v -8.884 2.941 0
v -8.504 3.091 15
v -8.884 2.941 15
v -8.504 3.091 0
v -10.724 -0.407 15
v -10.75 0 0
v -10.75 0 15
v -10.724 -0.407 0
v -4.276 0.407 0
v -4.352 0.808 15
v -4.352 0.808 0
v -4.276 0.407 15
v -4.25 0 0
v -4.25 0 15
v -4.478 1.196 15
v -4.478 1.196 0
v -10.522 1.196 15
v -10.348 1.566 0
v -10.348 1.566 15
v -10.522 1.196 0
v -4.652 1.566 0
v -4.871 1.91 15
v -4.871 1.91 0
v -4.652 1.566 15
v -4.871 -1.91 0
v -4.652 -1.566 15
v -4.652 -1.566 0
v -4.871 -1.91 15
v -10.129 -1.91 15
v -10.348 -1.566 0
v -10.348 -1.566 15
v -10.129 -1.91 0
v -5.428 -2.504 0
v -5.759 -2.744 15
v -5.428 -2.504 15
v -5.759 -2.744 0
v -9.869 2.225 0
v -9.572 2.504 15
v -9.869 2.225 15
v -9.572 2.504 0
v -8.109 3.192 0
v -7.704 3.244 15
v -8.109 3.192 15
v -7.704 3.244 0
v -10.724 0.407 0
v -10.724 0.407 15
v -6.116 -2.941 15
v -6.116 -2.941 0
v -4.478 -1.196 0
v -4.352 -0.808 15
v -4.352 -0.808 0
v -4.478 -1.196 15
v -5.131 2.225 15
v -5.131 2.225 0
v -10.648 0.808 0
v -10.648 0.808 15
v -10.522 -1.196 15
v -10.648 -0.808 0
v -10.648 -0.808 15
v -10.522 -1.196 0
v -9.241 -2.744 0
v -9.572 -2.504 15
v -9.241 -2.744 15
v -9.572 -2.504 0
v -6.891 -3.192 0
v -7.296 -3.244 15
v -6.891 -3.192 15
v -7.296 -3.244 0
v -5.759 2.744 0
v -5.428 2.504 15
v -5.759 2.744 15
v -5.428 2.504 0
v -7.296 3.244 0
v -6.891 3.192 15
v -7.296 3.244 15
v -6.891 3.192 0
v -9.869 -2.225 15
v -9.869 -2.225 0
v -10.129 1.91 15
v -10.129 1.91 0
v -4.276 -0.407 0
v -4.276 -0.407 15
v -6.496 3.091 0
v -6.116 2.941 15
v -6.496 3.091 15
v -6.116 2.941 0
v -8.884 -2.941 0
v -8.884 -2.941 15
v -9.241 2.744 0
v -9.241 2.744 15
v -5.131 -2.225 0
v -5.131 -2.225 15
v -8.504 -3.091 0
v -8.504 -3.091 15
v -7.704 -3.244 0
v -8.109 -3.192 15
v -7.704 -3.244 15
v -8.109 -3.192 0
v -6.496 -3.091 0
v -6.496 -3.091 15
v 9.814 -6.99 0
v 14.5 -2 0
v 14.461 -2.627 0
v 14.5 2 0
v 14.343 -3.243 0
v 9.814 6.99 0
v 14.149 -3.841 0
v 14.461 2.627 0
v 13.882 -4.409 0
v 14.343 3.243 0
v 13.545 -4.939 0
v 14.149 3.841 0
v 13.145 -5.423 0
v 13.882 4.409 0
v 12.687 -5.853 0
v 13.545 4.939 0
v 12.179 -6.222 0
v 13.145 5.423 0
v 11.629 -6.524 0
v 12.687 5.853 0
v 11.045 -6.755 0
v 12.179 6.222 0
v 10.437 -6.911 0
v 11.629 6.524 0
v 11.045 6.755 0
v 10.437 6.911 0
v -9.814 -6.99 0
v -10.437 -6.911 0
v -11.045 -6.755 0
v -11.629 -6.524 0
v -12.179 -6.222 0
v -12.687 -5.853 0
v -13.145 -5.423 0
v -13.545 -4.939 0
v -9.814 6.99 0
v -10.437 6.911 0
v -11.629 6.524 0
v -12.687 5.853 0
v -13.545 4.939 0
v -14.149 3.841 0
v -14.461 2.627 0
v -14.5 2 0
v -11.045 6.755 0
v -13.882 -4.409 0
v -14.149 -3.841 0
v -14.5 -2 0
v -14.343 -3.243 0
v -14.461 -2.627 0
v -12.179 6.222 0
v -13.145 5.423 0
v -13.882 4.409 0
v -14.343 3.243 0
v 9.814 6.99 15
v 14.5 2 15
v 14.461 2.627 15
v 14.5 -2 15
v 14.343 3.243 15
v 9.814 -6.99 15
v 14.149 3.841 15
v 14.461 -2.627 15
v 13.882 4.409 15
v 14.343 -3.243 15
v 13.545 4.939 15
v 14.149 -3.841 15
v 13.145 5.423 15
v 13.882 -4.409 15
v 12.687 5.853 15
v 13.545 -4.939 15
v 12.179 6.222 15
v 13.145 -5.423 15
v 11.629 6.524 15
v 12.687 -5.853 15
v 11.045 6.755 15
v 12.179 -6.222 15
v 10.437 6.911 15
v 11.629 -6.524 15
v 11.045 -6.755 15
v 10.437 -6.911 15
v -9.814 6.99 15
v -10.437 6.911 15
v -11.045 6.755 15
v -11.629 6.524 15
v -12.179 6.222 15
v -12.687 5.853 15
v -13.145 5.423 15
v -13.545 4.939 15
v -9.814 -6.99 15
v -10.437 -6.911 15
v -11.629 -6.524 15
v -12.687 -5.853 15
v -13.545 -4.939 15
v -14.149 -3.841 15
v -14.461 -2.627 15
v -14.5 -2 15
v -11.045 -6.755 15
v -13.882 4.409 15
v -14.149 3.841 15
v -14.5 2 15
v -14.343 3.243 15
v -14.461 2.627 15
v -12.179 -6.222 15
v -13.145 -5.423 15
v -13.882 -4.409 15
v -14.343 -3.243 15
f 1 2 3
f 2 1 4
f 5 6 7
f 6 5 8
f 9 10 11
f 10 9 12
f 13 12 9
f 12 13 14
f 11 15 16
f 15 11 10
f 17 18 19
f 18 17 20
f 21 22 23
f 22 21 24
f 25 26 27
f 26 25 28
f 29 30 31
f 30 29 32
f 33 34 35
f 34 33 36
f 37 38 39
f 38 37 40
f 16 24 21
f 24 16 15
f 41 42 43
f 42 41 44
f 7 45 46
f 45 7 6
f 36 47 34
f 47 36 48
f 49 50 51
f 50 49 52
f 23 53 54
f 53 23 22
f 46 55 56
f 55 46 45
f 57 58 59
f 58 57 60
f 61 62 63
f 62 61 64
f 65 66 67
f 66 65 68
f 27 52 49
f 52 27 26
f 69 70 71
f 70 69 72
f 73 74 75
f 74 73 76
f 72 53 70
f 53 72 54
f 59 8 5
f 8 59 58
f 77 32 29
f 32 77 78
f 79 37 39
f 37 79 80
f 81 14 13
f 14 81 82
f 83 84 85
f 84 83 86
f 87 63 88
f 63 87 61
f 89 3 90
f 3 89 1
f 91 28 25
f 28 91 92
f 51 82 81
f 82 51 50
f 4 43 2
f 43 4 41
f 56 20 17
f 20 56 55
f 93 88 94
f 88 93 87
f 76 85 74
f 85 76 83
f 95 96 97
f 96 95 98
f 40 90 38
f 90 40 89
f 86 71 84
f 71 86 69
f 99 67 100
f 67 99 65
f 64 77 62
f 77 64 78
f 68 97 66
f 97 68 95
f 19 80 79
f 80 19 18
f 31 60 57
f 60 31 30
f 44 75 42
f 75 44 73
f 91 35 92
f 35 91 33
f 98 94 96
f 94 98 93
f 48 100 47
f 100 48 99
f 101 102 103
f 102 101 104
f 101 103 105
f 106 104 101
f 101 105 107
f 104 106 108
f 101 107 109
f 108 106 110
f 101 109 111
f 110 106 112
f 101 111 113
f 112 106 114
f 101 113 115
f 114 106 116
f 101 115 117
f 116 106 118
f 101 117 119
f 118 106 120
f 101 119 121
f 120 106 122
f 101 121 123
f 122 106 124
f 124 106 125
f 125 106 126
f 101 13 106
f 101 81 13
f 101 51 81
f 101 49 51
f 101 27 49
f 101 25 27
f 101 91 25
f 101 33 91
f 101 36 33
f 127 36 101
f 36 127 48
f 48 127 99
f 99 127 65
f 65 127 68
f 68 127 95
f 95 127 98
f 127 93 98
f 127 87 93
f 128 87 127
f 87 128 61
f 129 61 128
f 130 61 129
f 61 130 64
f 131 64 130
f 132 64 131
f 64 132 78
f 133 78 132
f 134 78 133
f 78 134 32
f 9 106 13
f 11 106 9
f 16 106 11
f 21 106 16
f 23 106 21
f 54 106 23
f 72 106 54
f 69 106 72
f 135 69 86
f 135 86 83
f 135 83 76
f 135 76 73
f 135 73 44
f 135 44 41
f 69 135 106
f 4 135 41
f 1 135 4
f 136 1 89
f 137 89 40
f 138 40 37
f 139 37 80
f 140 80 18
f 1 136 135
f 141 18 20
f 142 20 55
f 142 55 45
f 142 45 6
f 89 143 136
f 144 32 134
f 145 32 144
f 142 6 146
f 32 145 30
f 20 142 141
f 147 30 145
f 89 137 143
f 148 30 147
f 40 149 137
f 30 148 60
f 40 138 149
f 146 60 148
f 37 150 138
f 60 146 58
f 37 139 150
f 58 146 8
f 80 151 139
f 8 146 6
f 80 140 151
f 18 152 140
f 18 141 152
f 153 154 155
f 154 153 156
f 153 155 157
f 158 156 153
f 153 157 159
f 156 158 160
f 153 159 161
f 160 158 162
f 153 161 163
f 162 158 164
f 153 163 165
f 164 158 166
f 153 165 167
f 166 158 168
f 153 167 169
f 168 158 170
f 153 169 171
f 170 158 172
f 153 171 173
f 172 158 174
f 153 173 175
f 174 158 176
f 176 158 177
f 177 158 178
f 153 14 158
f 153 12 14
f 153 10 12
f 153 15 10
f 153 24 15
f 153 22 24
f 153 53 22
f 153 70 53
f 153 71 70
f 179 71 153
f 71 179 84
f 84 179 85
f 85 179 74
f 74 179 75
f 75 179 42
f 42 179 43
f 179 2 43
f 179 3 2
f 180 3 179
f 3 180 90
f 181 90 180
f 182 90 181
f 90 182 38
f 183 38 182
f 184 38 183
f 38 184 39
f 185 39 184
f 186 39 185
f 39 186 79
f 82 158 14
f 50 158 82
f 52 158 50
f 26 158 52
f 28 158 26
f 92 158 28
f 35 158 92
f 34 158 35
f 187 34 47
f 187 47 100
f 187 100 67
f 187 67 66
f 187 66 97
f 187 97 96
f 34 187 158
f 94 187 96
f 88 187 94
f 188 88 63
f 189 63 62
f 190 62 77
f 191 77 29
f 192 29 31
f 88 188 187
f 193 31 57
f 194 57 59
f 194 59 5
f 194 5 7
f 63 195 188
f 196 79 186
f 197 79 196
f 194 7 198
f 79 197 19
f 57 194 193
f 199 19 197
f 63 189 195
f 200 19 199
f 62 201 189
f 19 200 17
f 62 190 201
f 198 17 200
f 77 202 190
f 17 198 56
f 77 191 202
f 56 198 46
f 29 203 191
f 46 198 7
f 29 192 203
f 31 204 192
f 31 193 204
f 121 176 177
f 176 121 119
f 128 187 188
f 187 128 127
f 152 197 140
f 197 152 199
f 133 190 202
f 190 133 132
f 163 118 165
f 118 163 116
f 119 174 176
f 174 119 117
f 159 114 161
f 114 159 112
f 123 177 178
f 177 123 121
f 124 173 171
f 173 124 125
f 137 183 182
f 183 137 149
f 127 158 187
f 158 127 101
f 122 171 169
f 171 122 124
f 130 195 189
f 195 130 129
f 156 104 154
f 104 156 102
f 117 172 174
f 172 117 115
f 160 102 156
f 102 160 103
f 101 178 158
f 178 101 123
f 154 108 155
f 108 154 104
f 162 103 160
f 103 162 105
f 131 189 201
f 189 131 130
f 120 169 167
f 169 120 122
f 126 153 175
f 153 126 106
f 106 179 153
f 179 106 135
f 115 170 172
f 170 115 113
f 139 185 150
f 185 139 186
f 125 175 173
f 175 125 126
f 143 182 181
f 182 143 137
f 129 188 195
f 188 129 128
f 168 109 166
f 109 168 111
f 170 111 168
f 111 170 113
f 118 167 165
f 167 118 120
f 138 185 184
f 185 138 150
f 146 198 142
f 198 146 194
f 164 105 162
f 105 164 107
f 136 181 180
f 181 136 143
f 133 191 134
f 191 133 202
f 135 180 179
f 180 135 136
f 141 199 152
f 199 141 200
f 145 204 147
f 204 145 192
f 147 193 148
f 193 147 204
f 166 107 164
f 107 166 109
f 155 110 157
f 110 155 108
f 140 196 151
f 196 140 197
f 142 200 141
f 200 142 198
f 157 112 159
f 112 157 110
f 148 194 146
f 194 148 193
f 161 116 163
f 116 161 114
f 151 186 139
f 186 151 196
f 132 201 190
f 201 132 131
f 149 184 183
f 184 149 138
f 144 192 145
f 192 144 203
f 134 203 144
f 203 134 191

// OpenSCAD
$fn = 50;


difference() {
	union() {
		hull() {
			translate(v = [-9.5000000000, 2.0000000000, 0]) {
				cylinder(h = 15, r = 5);
			}
			translate(v = [9.5000000000, 2.0000000000, 0]) {
				cylinder(h = 15, r = 5);
			}
			translate(v = [-9.5000000000, -2.0000000000, 0]) {
				cylinder(h = 15, r = 5);
			}
			translate(v = [9.5000000000, -2.0000000000, 0]) {
				cylinder(h = 15, r = 5);
			}
		}
	}
	union() {
		translate(v = [-7.5000000000, 0.0000000000, 0]) {
			cylinder(h = 15, r = 3.2500000000);
		}
		translate(v = [-7.5000000000, 0.0000000000, 0]) {
			cylinder(h = 15, r = 1.8000000000);
		}
		translate(v = [-7.5000000000, 0.0000000000, 0]) {
			cylinder(h = 15, r = 1.8000000000);
		}
		translate(v = [-7.5000000000, 0.0000000000, 0]) {
			cylinder(h = 15, r = 1.8000000000);
		}
	}
}
